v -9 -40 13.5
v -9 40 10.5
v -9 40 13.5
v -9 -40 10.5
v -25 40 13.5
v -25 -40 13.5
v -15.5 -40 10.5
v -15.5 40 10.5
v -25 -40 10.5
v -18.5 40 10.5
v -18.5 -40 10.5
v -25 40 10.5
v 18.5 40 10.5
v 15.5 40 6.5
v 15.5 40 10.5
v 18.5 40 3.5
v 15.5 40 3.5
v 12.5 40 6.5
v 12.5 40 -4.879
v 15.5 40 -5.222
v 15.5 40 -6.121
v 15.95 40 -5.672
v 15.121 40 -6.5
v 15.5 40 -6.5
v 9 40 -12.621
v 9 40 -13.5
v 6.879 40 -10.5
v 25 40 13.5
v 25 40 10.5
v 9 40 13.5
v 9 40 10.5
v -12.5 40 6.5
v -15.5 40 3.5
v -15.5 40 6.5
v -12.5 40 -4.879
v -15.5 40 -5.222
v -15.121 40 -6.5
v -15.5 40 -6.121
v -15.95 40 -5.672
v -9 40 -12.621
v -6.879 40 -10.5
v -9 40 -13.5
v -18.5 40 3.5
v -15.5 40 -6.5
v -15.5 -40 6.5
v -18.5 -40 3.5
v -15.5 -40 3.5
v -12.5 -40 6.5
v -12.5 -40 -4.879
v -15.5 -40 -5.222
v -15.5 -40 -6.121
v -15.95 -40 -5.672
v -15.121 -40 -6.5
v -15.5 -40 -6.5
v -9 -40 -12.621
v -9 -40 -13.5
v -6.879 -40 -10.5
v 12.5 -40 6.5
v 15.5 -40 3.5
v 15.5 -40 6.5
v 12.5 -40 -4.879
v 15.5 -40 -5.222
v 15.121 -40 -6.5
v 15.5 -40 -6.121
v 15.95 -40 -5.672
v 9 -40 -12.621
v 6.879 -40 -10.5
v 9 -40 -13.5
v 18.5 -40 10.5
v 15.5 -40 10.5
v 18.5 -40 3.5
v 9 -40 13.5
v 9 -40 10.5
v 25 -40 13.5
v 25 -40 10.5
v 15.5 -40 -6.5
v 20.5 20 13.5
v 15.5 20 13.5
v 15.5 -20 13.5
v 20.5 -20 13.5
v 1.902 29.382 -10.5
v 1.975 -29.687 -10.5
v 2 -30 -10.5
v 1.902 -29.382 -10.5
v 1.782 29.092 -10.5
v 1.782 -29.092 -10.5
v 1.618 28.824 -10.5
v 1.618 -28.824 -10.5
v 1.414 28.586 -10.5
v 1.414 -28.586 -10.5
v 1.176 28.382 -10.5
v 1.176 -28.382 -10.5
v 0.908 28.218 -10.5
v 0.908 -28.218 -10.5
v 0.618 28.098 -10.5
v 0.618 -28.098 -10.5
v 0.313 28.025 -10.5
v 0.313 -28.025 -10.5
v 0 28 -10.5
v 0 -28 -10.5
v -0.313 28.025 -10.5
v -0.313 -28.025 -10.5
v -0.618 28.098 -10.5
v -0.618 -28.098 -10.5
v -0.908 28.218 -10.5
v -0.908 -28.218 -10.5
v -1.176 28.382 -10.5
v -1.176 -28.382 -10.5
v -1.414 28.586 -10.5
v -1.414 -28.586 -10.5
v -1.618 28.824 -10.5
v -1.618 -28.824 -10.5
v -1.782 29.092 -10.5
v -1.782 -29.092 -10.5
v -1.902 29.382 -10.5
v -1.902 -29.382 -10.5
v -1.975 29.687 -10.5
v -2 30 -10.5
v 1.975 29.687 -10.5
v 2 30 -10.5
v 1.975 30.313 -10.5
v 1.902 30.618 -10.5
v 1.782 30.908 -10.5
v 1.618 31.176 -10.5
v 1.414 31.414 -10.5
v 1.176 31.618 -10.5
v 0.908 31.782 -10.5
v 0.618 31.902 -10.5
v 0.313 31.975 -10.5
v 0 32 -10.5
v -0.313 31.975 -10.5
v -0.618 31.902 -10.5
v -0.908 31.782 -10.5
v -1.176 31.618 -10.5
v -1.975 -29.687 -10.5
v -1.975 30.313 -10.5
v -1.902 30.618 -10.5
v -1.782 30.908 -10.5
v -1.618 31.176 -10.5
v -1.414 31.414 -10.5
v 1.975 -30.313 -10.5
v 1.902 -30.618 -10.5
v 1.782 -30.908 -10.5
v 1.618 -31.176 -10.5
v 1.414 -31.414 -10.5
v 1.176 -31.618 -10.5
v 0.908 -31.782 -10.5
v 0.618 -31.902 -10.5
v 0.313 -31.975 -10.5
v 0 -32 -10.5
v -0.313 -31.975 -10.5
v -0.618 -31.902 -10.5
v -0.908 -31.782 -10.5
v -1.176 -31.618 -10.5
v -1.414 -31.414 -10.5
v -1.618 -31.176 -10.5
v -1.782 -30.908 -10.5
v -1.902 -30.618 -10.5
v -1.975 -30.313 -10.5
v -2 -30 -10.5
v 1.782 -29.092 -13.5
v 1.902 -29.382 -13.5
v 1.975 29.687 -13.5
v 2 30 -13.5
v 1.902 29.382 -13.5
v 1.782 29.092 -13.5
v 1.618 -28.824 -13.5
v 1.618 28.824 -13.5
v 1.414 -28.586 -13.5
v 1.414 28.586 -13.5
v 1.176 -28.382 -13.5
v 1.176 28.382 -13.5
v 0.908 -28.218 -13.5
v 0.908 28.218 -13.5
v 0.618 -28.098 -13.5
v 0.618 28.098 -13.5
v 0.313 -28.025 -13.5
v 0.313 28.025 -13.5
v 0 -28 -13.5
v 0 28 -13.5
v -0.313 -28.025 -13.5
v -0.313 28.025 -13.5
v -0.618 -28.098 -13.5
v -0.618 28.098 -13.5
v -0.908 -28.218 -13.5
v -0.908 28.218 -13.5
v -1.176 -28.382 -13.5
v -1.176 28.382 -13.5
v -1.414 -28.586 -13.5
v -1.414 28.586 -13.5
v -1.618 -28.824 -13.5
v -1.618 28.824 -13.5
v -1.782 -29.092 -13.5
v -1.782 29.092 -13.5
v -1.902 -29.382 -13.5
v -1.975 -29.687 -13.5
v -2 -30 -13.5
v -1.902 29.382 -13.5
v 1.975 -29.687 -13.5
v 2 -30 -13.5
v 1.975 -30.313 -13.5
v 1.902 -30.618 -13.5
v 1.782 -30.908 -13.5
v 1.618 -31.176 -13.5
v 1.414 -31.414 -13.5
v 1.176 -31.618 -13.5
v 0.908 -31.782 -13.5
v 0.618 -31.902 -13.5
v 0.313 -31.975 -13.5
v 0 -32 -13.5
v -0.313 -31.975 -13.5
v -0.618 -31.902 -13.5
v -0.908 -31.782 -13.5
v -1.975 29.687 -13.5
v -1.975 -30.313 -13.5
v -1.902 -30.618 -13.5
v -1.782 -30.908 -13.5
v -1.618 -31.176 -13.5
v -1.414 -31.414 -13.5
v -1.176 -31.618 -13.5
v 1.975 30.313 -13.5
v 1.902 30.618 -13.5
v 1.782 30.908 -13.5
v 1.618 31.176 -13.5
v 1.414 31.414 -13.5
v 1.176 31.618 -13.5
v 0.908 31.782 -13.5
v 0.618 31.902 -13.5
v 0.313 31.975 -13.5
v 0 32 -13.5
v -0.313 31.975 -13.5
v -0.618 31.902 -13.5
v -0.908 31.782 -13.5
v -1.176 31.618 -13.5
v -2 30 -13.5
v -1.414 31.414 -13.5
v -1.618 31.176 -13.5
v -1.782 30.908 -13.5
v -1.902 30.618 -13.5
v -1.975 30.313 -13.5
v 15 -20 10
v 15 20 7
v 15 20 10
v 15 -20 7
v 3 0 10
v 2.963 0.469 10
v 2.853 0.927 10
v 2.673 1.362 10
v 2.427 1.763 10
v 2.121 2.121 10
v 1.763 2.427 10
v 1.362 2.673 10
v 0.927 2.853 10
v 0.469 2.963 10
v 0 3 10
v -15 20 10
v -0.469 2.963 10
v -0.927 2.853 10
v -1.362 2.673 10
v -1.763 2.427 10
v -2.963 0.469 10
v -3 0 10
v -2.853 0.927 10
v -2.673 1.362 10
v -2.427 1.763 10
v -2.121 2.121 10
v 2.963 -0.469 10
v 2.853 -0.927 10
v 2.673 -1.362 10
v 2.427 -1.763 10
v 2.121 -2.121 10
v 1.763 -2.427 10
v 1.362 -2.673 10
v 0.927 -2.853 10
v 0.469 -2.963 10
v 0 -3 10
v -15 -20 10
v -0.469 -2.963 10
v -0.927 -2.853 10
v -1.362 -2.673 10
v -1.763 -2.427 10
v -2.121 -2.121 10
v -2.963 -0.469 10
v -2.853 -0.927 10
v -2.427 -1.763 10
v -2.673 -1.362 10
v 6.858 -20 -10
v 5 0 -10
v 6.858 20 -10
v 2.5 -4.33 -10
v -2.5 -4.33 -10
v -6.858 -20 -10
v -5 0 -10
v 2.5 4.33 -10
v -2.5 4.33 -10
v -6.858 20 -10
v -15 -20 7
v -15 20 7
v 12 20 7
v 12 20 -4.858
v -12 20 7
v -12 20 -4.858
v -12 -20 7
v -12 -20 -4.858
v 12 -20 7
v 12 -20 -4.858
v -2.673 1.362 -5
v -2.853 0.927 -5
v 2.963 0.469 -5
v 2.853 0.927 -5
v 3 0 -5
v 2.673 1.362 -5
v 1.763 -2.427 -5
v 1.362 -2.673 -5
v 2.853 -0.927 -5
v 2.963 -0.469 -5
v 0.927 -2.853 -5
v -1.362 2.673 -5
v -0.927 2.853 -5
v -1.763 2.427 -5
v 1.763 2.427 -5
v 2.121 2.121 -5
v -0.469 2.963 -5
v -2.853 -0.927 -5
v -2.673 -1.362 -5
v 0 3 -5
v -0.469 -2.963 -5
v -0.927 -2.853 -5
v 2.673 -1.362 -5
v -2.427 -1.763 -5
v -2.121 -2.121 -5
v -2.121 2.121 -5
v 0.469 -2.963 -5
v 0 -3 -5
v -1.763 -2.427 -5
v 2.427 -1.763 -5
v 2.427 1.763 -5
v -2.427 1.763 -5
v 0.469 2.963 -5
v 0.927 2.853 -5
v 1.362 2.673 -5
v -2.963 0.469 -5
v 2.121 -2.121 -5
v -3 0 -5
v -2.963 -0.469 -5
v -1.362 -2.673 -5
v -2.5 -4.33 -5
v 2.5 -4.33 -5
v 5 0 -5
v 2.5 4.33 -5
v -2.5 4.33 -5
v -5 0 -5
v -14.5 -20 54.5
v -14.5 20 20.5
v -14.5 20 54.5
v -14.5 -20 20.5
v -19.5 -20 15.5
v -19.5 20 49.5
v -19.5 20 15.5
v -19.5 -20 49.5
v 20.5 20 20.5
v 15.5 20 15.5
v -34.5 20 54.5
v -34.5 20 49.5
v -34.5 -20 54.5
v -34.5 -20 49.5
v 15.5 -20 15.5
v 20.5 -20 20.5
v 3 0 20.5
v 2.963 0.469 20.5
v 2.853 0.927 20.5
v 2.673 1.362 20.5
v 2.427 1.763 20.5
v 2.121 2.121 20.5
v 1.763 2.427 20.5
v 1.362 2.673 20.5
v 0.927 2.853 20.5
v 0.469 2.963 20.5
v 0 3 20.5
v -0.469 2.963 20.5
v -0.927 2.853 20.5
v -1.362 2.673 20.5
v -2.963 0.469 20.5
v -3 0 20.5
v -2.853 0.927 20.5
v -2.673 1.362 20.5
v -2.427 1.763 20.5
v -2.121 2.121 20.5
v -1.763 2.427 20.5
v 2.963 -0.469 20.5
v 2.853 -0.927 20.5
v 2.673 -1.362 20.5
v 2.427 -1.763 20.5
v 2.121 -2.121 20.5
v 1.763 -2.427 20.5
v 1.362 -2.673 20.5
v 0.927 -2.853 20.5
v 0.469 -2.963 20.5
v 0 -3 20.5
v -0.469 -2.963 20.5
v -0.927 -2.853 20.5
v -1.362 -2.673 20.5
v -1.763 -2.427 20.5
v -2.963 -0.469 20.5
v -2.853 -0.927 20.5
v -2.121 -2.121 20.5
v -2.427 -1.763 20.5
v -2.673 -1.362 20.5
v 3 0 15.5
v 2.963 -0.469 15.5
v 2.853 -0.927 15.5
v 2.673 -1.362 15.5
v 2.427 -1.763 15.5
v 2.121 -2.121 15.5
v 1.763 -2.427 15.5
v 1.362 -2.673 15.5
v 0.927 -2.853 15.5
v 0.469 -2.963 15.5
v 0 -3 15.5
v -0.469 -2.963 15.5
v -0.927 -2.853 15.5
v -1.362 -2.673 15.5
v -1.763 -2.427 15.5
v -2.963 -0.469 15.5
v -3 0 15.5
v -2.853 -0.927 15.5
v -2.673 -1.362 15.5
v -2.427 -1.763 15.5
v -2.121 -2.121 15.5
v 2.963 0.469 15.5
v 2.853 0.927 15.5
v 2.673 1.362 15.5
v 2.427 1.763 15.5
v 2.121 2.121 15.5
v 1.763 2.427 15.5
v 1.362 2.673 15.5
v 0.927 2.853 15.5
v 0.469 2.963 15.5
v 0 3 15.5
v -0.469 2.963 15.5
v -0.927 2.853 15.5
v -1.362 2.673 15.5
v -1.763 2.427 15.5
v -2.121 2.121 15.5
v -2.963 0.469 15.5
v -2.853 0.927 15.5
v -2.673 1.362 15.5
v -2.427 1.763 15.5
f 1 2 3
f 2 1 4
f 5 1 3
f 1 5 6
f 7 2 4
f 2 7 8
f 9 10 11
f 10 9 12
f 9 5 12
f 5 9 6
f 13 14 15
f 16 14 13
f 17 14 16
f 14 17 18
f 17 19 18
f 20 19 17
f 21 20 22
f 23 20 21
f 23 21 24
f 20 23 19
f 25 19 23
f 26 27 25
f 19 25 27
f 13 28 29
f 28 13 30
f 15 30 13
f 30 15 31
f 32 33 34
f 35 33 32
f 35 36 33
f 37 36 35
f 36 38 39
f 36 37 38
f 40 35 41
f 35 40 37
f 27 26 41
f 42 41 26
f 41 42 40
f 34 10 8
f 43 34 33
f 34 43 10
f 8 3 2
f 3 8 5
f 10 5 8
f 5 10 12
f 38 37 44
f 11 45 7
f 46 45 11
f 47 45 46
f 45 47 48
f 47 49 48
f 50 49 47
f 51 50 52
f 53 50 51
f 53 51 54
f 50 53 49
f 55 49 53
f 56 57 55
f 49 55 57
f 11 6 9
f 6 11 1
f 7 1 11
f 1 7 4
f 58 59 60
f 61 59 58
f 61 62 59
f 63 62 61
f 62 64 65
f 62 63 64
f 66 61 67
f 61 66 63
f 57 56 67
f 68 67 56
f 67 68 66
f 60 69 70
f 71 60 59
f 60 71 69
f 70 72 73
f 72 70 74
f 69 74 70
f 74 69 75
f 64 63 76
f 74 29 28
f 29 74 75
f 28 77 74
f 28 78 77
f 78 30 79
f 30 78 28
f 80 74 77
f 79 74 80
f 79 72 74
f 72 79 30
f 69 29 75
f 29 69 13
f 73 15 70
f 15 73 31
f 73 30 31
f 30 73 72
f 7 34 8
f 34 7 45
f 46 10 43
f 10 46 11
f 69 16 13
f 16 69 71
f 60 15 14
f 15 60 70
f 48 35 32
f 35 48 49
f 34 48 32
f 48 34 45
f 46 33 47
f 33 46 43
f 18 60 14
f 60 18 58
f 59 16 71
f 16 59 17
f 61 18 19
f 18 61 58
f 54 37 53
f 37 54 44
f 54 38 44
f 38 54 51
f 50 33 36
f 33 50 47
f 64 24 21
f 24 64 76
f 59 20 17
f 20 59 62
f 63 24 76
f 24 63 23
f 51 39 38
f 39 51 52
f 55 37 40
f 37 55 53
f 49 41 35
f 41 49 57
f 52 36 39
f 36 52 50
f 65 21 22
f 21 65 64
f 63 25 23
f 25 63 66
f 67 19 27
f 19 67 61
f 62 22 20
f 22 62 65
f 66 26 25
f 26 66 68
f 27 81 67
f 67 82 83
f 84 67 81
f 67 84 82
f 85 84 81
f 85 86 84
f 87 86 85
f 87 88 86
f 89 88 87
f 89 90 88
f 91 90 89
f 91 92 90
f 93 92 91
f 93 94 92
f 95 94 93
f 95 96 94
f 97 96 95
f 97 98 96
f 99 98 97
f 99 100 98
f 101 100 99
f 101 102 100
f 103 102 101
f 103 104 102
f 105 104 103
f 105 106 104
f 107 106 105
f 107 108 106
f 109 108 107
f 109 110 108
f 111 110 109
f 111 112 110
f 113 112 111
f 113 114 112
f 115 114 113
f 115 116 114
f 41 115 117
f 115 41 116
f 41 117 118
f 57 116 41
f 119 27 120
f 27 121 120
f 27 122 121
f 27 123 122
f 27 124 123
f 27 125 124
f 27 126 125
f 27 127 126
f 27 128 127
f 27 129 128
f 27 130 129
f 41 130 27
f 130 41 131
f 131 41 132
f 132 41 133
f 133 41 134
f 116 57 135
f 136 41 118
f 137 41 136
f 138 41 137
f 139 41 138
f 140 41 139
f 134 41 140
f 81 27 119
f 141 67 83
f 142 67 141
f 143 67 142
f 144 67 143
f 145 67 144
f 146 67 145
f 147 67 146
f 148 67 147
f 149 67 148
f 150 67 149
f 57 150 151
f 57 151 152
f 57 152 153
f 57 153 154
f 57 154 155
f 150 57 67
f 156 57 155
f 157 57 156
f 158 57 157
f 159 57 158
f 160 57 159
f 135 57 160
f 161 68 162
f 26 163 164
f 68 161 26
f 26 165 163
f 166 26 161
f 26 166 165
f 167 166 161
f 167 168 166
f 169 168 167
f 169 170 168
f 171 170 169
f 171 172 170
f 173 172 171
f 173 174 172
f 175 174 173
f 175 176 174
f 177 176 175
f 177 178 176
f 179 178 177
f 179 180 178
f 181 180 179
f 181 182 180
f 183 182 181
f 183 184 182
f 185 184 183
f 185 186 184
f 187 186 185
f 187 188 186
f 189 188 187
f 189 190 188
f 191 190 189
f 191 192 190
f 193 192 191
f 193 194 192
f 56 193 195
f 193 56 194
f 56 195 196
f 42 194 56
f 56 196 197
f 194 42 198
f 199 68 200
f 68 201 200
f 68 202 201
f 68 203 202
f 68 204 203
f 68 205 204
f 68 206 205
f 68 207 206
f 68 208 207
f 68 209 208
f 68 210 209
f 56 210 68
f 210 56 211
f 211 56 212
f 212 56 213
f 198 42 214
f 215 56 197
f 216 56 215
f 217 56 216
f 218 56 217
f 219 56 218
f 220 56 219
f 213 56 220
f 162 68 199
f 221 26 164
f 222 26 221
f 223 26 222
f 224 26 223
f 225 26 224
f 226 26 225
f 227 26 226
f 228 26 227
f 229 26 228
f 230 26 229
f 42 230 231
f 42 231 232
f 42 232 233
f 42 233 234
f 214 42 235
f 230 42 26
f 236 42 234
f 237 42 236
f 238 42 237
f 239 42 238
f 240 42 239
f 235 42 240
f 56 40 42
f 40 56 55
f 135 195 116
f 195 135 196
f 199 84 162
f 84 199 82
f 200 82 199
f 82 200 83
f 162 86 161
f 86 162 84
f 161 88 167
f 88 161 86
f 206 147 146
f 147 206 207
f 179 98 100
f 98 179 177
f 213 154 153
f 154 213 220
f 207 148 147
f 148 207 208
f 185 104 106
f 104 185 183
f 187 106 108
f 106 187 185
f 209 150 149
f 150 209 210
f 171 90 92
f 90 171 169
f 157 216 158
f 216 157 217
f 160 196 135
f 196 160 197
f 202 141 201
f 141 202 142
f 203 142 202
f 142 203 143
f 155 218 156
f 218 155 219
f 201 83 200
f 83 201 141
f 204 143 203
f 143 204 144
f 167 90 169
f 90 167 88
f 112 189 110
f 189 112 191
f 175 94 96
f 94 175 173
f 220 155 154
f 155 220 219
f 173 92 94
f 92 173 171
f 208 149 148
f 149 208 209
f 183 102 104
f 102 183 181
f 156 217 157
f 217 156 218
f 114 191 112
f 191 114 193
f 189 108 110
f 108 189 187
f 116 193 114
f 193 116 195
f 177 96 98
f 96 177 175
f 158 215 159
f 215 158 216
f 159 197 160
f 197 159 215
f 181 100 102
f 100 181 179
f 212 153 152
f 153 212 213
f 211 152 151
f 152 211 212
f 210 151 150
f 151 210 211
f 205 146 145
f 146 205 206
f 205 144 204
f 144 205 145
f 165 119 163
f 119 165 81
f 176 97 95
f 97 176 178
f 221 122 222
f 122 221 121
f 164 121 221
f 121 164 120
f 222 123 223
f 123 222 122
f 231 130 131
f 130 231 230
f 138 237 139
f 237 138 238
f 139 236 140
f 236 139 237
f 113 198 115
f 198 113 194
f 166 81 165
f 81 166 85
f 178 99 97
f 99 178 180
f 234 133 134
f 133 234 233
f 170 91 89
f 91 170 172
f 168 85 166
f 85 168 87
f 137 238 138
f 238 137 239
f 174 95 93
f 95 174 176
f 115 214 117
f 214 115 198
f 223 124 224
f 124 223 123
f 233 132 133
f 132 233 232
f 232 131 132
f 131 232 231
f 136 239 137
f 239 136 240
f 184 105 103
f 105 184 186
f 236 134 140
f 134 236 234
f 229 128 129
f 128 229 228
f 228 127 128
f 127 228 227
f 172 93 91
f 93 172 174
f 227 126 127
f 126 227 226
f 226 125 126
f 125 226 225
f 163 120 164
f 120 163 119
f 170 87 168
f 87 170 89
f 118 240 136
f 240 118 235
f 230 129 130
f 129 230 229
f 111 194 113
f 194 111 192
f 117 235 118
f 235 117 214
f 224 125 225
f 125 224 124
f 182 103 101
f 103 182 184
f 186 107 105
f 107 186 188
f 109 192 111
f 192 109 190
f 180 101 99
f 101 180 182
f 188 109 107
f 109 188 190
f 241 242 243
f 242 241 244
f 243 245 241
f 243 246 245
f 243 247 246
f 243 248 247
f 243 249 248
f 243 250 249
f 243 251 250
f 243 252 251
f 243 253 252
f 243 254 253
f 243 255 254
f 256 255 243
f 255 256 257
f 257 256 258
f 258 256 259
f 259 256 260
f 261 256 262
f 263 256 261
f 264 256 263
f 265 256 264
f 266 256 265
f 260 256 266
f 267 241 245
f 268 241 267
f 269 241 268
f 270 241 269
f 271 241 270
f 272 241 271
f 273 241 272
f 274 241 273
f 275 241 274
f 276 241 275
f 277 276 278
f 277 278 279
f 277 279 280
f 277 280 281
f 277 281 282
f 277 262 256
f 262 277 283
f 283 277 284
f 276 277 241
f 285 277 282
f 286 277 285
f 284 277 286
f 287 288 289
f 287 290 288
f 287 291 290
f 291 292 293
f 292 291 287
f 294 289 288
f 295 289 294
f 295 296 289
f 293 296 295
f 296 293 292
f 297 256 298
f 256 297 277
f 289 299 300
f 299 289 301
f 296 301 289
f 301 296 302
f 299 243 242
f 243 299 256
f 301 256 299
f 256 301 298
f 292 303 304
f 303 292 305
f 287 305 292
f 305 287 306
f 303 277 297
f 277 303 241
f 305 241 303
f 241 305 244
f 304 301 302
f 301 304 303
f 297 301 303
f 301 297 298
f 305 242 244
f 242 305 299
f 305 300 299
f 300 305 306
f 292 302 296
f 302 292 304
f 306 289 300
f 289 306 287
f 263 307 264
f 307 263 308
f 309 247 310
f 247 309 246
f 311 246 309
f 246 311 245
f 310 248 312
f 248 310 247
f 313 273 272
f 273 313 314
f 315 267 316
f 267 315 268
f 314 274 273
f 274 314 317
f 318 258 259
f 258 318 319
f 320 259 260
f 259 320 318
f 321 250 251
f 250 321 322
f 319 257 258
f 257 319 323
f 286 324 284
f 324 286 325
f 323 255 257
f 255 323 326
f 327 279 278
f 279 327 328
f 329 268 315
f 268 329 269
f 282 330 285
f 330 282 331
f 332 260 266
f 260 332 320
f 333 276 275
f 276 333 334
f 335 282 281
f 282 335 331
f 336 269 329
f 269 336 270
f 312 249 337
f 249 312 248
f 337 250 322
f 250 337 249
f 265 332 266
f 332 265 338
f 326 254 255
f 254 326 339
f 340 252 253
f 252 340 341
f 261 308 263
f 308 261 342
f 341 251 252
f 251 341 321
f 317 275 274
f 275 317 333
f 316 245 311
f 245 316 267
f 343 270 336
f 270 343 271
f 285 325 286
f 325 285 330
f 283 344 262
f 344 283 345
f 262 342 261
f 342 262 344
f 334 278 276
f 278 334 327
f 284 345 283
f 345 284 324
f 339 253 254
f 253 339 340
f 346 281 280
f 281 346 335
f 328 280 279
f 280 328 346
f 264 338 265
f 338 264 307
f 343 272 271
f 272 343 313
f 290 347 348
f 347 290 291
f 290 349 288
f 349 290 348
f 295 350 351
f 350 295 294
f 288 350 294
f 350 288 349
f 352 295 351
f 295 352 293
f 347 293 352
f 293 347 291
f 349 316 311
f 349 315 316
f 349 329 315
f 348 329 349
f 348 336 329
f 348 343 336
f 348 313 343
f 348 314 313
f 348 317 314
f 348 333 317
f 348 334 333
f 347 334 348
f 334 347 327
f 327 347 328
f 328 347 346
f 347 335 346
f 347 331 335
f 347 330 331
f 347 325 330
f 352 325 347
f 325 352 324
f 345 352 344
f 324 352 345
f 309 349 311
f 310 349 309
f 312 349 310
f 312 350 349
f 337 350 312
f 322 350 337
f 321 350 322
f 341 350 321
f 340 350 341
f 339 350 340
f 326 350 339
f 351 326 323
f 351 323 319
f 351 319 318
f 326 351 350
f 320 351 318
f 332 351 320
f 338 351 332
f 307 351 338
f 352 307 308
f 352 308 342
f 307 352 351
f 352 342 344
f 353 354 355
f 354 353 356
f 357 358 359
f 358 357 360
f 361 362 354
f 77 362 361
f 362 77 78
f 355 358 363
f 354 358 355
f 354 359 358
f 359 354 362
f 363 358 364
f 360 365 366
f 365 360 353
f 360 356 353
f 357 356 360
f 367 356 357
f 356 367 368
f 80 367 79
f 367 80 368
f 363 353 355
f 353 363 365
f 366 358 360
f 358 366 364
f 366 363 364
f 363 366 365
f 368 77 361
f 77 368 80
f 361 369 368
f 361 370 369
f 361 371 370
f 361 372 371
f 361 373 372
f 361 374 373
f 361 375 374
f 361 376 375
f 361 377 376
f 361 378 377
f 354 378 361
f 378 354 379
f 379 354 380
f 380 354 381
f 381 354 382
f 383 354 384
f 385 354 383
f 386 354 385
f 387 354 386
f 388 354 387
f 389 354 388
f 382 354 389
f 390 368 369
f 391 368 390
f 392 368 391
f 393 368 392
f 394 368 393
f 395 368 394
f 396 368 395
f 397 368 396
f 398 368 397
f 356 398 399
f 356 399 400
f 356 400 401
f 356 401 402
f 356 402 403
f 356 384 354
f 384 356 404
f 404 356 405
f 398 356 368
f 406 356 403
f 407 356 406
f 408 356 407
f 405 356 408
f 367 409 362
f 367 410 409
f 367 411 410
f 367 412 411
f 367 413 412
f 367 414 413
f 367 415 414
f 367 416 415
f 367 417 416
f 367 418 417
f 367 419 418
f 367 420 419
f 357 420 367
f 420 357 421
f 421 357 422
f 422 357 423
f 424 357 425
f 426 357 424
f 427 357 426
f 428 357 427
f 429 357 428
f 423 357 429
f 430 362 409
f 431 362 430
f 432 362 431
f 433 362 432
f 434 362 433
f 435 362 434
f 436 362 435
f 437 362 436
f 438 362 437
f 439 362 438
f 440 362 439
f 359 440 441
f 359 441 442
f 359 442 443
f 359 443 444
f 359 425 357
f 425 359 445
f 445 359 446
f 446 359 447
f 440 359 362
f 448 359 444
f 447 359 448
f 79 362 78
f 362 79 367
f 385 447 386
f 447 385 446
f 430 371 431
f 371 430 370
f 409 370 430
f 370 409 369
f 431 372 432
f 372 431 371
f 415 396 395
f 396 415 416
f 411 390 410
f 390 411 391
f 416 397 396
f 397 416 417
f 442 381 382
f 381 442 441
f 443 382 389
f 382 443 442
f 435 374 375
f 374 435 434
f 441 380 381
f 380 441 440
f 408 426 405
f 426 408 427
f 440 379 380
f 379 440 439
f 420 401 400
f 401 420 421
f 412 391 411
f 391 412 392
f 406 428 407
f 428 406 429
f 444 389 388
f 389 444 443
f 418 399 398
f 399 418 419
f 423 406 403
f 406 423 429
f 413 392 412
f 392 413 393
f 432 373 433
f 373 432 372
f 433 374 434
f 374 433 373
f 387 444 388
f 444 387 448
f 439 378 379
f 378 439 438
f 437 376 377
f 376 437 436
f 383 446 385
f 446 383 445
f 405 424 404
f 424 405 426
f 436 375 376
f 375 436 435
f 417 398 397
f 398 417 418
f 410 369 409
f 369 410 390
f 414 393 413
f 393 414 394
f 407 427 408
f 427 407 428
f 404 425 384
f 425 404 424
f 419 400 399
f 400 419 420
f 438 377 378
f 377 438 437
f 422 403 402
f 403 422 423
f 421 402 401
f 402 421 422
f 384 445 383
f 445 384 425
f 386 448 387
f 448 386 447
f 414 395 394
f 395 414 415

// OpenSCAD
// Solar Mount

/* [Parts] */
Rail = true;
Nut = true;
Clamp = true;


// --------------------------


module Rail() {
    L= 80;
    W = 3;
    
    difference() {
    
        union() {
            translate([-17,0,12])
            cube([16,L,W],center=true);
            
            translate([17,0,12])
            cube([16,L,W],center=true);
            
            translate([-17,0,8])
            cube([W,L,6],center=true);
            
            translate([17,0,8])
            cube([W,L,6],center=true);
            
            translate([-15.5,0,5])
            cube([6,L,W],center=true);
            
            translate([15.5,0,5])
            cube([6,L,W],center=true);
            
            translate([-14,0,-1])
            cube([W,L,11],center=true);
            
            translate([14,0,-1])
            cube([W,L,11],center=true);
            
            translate([-11,0,-8.5])
            rotate([0,-45,0])
            cube([W,L,11],center=true);
            
            translate([11,0,-8.5])
            rotate([0,-135,0])
            cube([W,L,11],center=true);
            
            translate([0,0,-12])
            cube([18,L,W],center=true);    
        }
        translate([0,-30,0])
        cylinder(d=4,h=50,center=true,$fn=40);
        translate([0,30,0])
        cylinder(d=4,h=50,center=true,$fn=40);
    }
    
}

module Nut() {
    
    difference() {
    
        translate([0,0,0])
        cube([30,40,20],center=true);

        translate([-32,0,-3])
        cube([40,50,20],center=true);
        
        translate([32,0,-3])
        cube([40,50,20],center=true);
        
        translate([-28,0,-3])
        rotate([0,-135,0])
        cube([40,50,20],center=true);

        translate([28,0,-3])
        rotate([0,-45,0])
        cube([40,50,20],center=true);

        cylinder(d=6,h=50,center=true,$fn=40);
        translate([0,0,-8])
        cylinder(d=10,h=6,center=true,$fn=6);
    }
}

module Clamp() {
    W =5;
    
    difference() {
        union()
        translate([-17,0,35])    
        {
            translate([0,0,0])
            cube([W,40, 35],center=true);
            translate([-7.5,0,17])
            cube([20,40,W],center=true);
            translate([17.5,0,-17])
            cube([40,40,W],center=true);
            translate([35,0,-20])
            cube([W,40,W],center=true);
        }
        translate([0,0,30])
        cylinder(d=6,h=50,center=true,$fn=40);
    }
}

// --------------------------

if (Rail) color("Green")Rail();
    
if (Nut) Nut();
    
if (Clamp) color("Silver") Clamp();
    
